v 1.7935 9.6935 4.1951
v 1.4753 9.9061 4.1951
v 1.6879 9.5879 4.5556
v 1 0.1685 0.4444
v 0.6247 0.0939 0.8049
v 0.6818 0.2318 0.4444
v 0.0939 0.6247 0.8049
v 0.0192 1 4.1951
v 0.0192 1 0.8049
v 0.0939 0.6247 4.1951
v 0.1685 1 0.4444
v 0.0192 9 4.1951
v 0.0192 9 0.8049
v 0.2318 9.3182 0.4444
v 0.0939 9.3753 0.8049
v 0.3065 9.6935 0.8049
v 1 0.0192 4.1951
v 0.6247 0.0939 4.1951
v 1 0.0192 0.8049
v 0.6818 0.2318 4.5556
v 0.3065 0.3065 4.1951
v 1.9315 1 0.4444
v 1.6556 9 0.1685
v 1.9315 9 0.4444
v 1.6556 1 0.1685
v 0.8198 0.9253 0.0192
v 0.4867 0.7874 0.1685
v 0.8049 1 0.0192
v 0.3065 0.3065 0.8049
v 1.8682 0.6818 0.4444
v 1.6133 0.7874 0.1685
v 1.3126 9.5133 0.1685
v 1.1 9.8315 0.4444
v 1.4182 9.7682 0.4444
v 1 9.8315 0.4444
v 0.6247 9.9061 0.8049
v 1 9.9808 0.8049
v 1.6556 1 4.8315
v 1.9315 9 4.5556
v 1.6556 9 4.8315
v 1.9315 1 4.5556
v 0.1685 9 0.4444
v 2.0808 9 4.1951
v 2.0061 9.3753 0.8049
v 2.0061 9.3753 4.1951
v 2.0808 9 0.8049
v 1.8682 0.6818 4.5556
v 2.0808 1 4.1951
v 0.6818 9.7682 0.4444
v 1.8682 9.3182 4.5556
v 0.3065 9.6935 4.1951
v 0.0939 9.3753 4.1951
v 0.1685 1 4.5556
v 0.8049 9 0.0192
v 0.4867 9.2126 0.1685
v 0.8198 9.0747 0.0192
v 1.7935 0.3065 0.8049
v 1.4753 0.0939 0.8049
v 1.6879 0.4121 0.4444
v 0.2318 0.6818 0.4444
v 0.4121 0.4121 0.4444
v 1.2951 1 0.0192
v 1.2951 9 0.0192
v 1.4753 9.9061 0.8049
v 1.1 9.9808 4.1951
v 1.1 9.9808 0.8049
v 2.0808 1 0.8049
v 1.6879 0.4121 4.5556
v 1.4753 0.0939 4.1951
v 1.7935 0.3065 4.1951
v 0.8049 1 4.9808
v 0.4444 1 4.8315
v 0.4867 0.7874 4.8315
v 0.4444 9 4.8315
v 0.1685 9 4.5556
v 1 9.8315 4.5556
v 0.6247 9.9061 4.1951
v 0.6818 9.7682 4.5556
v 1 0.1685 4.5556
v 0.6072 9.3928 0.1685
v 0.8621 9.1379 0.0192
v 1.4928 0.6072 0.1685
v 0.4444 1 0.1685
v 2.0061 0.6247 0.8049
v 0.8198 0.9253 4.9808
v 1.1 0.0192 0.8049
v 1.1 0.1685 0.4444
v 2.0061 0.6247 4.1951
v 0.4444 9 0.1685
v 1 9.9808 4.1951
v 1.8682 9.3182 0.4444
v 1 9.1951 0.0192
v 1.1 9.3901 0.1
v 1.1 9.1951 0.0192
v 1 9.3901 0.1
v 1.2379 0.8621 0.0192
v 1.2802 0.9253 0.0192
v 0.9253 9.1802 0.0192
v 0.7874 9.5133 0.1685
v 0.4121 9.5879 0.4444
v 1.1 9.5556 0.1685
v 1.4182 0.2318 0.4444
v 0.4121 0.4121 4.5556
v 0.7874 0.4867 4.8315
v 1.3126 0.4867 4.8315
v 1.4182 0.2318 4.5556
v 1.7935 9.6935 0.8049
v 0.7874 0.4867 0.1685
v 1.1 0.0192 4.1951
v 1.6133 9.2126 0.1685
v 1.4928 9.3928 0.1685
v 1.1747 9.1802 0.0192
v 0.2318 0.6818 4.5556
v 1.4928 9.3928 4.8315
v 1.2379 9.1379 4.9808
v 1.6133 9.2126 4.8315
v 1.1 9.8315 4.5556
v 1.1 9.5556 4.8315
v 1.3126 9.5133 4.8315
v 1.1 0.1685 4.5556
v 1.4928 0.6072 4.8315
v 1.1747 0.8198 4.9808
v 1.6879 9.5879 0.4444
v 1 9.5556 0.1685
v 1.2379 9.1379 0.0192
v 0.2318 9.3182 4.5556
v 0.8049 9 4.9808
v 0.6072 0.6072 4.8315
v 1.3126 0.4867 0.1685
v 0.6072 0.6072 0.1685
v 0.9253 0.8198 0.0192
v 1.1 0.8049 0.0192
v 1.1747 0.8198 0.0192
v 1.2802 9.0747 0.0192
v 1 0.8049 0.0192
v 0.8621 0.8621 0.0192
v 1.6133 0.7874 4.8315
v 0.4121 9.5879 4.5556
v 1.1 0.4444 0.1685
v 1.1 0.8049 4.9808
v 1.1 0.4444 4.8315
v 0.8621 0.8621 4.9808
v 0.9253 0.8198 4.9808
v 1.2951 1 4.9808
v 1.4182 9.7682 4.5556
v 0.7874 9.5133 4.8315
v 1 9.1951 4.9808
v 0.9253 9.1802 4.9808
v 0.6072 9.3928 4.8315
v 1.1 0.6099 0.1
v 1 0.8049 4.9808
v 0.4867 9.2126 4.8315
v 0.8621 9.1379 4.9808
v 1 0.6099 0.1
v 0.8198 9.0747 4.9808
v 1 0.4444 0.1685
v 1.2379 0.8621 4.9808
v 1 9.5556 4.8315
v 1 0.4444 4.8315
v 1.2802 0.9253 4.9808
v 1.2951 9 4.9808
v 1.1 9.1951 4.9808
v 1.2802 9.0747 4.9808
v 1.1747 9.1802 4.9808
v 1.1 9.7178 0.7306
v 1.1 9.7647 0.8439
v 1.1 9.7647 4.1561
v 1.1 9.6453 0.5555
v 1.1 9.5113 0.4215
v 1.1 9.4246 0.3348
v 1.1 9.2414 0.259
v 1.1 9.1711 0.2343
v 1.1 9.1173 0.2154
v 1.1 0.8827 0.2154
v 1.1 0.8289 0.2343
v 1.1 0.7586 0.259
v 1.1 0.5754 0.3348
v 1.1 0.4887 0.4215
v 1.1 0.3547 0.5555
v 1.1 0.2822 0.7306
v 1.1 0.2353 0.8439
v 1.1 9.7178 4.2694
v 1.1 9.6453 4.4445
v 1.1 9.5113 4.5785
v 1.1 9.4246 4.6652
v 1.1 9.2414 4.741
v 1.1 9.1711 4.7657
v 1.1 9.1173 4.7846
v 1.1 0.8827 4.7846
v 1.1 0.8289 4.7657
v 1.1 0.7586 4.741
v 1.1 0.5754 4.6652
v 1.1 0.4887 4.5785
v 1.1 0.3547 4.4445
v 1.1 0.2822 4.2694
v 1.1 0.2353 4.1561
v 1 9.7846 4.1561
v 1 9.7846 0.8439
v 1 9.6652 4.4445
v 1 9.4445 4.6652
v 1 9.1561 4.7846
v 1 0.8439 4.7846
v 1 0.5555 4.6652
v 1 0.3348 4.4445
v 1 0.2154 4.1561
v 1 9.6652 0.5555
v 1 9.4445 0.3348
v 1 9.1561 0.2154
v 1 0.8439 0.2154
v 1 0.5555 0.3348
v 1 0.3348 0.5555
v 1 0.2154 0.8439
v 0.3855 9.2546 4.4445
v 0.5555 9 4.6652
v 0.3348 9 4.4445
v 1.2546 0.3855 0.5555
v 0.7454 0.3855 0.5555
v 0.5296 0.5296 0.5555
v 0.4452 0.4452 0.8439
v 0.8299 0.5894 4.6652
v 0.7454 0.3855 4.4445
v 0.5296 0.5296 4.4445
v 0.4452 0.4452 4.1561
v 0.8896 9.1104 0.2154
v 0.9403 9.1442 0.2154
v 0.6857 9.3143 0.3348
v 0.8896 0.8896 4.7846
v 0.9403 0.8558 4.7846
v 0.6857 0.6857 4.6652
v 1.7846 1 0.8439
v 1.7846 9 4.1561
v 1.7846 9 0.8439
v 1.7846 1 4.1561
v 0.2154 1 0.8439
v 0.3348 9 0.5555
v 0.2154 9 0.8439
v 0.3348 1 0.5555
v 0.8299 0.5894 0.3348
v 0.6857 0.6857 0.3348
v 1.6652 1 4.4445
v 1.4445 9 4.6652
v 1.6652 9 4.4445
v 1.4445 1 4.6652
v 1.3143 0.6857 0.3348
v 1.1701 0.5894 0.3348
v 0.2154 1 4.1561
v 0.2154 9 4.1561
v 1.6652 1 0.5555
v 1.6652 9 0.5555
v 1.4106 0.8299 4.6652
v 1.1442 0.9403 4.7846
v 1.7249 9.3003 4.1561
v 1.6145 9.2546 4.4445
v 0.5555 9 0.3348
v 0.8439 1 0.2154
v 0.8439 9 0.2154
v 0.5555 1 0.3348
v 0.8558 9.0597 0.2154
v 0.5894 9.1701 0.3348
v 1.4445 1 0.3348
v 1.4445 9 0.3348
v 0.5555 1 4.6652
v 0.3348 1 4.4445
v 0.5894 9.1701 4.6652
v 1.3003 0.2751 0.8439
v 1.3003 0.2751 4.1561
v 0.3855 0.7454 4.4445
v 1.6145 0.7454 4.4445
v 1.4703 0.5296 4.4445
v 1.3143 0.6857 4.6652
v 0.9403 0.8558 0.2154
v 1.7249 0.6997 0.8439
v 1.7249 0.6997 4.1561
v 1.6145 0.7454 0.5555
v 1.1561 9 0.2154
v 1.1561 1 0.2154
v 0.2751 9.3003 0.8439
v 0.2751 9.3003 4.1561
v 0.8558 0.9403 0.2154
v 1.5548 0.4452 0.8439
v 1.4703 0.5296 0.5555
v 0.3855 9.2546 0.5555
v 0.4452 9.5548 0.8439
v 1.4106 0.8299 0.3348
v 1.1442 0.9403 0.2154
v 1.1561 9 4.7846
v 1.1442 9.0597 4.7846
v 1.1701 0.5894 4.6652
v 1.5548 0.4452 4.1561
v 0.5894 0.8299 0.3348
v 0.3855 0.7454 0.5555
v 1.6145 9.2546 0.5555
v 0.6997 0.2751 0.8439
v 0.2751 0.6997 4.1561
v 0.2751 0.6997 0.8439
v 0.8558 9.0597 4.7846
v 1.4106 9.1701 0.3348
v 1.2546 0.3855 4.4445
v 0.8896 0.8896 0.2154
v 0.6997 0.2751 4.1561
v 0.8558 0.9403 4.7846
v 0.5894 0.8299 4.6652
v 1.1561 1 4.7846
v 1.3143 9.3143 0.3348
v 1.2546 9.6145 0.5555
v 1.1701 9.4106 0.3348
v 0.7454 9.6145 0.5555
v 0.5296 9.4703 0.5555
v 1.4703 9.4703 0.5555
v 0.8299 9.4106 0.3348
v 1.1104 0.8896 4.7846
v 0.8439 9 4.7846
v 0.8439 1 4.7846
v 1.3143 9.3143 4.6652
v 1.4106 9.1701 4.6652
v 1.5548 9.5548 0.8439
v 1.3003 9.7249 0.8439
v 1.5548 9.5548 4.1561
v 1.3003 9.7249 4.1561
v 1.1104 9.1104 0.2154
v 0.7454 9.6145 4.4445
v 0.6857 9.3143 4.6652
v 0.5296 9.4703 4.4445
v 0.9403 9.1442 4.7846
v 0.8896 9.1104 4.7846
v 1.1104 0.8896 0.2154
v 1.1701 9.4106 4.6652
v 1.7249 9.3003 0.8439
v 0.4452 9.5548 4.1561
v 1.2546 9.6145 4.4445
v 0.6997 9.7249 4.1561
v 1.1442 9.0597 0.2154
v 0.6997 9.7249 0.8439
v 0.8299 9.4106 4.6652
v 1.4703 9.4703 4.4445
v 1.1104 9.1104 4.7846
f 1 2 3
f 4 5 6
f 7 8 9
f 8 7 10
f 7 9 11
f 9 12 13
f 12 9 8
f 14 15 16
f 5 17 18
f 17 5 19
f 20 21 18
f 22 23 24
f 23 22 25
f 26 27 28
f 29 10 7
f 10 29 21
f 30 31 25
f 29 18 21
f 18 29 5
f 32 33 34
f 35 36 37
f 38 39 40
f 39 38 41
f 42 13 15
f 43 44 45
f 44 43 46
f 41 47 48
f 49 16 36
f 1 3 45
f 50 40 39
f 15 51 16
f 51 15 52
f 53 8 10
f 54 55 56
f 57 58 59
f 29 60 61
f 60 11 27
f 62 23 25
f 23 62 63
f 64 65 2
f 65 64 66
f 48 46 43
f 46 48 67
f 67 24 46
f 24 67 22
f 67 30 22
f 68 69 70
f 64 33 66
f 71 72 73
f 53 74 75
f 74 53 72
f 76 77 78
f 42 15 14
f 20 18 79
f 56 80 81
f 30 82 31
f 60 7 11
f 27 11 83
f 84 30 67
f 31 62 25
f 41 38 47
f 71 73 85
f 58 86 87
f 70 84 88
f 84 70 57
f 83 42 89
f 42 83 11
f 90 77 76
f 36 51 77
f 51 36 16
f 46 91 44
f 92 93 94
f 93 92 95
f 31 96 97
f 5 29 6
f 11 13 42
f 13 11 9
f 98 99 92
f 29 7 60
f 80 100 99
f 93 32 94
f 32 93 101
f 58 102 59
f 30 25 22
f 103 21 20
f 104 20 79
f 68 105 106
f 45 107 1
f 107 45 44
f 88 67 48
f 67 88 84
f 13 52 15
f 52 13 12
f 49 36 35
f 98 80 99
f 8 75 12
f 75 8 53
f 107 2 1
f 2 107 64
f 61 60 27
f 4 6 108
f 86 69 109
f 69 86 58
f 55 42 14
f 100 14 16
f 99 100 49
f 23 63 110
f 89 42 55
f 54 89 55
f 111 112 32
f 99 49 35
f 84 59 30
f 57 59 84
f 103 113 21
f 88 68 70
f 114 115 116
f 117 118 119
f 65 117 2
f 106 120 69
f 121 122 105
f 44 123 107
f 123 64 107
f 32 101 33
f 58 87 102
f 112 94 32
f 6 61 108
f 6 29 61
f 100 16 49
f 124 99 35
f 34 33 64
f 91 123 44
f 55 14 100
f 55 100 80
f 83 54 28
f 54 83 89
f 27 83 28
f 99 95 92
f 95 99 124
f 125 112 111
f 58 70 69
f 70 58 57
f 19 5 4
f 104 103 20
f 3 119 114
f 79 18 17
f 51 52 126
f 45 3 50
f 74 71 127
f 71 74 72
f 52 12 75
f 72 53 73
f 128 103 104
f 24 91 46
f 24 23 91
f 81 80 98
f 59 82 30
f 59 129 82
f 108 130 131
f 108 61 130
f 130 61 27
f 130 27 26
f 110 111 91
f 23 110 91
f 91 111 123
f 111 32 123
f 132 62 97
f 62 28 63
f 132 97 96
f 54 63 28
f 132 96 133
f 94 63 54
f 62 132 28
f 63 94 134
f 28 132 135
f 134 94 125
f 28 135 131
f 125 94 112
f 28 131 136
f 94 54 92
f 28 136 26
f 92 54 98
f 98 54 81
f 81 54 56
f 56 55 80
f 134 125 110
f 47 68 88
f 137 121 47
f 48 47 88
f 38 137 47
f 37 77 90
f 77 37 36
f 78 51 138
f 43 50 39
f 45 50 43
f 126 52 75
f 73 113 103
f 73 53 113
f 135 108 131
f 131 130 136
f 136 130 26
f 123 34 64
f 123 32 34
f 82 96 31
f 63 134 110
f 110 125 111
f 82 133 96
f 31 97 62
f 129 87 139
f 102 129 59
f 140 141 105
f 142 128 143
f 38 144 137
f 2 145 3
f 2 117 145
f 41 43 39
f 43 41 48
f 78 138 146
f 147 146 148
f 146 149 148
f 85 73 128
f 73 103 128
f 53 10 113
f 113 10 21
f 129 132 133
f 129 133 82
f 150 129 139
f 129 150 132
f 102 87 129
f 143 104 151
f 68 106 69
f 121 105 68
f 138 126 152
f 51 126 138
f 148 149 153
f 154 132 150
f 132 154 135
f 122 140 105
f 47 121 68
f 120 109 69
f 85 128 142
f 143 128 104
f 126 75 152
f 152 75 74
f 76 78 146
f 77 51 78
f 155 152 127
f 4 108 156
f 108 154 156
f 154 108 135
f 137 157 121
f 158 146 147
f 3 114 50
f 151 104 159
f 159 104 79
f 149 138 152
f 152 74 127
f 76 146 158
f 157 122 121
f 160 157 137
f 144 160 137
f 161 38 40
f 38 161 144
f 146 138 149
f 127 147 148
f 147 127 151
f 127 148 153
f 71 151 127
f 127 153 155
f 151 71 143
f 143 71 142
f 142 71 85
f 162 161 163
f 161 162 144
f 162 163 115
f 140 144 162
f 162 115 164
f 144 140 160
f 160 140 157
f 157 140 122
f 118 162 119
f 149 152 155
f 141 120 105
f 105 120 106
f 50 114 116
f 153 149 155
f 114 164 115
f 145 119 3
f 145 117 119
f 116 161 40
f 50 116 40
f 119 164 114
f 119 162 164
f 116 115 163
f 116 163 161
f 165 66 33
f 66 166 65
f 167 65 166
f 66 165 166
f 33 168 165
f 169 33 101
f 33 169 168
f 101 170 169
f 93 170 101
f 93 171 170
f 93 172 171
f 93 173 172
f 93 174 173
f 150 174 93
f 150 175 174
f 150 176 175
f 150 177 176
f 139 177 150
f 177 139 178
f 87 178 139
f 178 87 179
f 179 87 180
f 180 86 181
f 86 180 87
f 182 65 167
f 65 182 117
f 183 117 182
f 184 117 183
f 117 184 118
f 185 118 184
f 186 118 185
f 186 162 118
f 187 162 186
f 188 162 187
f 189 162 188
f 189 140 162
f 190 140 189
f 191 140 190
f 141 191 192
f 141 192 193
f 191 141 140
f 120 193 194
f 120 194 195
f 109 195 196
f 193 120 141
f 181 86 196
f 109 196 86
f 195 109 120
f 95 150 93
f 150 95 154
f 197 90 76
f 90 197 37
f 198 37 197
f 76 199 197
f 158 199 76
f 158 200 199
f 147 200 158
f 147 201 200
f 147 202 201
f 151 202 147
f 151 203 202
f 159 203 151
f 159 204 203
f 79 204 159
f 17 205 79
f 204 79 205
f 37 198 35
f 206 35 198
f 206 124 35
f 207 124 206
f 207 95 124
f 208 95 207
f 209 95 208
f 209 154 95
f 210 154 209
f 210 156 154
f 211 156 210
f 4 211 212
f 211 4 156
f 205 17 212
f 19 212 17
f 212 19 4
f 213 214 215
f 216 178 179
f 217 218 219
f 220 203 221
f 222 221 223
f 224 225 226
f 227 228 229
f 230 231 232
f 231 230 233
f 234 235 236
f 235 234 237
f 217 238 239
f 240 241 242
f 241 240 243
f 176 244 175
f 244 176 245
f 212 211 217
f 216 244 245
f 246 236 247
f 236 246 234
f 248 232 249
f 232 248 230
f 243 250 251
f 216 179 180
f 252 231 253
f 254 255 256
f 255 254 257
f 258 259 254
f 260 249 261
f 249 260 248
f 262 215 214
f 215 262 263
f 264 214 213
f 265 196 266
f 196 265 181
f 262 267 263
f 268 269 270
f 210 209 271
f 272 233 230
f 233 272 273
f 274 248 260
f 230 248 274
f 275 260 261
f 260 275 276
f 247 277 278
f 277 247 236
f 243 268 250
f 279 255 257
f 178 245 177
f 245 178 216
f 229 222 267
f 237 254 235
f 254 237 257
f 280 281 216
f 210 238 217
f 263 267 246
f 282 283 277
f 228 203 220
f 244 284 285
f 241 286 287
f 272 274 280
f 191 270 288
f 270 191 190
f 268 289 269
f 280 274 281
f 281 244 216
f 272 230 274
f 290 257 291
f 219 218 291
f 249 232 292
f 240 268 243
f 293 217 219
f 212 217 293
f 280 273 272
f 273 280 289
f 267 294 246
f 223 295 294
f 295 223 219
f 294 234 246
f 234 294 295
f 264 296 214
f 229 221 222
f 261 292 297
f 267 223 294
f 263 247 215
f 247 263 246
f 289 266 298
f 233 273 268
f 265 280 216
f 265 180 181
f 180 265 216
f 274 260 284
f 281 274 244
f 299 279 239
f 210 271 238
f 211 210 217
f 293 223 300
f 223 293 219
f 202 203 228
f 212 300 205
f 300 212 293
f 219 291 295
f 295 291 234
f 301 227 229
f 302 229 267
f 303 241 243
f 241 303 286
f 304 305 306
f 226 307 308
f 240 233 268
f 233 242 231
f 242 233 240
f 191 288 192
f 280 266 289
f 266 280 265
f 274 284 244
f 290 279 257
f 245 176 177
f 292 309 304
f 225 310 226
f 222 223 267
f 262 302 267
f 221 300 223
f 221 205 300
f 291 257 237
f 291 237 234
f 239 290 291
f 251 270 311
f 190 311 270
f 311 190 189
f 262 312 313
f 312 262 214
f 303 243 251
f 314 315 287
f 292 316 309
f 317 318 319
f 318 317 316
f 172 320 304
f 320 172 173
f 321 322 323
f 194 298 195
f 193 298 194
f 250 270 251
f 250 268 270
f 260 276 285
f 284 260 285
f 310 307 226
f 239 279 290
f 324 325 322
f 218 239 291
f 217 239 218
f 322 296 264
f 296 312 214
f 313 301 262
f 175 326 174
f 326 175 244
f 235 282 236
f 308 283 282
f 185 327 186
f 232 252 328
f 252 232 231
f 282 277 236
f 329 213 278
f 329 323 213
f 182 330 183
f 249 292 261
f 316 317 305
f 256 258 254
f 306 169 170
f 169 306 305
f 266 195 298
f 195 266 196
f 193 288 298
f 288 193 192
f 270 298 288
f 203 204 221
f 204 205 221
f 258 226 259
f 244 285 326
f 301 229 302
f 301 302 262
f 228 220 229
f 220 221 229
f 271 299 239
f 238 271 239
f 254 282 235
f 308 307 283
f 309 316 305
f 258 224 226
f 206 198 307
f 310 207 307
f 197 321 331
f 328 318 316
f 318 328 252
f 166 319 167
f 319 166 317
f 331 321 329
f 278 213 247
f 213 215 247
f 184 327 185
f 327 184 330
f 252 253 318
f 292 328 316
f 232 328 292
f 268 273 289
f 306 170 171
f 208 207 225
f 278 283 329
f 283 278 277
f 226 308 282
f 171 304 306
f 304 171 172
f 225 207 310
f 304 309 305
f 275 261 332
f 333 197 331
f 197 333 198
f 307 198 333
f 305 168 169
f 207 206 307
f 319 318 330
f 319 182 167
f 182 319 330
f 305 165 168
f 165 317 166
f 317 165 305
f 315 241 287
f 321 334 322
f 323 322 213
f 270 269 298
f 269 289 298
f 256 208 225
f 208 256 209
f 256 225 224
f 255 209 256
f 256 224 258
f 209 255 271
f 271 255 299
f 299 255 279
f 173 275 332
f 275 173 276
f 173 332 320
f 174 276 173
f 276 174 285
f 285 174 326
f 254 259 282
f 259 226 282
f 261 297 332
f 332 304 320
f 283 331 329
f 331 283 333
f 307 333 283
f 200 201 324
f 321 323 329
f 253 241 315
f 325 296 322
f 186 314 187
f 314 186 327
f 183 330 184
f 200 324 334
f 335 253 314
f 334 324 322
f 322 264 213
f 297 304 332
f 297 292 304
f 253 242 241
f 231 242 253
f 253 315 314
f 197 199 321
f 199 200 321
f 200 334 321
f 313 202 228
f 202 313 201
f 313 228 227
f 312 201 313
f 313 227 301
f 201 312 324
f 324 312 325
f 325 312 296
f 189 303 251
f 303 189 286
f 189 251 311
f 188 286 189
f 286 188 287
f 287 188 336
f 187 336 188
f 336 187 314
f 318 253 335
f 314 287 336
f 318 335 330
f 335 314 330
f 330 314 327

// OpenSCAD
//Rounded cube module - faster than minkowski!
//variables with "customizer" in them are only for the Thingiverse customizer and are not essential.


customizer_x=2;
customizer_y=10;
customizer_z=5;

customizer_facets=16;
customizer_rounding_radius=1;
customizer_wall_thickness=0.1;

module rounded_cube(size_x,size_y,size_z,facets,rounding_radius)
{
	hull()
	{
		translate([rounding_radius,rounding_radius,rounding_radius])
            sphere (r=rounding_radius,$fn=facets);
		translate([size_x-rounding_radius,rounding_radius,rounding_radius])
             sphere (r=rounding_radius,$fn=facets);
		translate([rounding_radius,size_y-rounding_radius,rounding_radius])
             sphere (r=rounding_radius,$fn=facets);
		translate([size_x-rounding_radius,size_y-rounding_radius,rounding_radius])
             sphere (r=rounding_radius,$fn=facets);

		translate([rounding_radius,rounding_radius,size_z-rounding_radius])
             sphere (r=rounding_radius,$fn=facets);
		translate([size_x-rounding_radius,rounding_radius,size_z-rounding_radius])
             sphere (r=rounding_radius,$fn=facets);
		translate([rounding_radius,size_y-rounding_radius,size_z-rounding_radius])
             sphere (r=rounding_radius,$fn=facets);
		translate([size_x-rounding_radius,size_y-rounding_radius,size_z-rounding_radius])
             sphere (r=rounding_radius,$fn=facets);
	}
}

  rad = customizer_rounding_radius;
  facs = customizer_facets;
  wall = customizer_wall_thickness;
  x = customizer_x + wall;
  y = customizer_y;
  z = customizer_z;
  inside = 2 * wall;
  small_x = customizer_x - 4 * wall;
  small_y = customizer_y - 4 * wall;
  small_z = customizer_z - 4 * wall;
difference() {
  rounded_cube( x, y, z, facs, rad );
  translate( [ rad, -1 * rad, wall ] )
      cube( [ wall, y + rad, z + rad ] );
  
  translate( [ inside, inside, inside ] )
  rounded_cube( small_x, small_y, small_z, facs, rad - 2 * wall );
}
